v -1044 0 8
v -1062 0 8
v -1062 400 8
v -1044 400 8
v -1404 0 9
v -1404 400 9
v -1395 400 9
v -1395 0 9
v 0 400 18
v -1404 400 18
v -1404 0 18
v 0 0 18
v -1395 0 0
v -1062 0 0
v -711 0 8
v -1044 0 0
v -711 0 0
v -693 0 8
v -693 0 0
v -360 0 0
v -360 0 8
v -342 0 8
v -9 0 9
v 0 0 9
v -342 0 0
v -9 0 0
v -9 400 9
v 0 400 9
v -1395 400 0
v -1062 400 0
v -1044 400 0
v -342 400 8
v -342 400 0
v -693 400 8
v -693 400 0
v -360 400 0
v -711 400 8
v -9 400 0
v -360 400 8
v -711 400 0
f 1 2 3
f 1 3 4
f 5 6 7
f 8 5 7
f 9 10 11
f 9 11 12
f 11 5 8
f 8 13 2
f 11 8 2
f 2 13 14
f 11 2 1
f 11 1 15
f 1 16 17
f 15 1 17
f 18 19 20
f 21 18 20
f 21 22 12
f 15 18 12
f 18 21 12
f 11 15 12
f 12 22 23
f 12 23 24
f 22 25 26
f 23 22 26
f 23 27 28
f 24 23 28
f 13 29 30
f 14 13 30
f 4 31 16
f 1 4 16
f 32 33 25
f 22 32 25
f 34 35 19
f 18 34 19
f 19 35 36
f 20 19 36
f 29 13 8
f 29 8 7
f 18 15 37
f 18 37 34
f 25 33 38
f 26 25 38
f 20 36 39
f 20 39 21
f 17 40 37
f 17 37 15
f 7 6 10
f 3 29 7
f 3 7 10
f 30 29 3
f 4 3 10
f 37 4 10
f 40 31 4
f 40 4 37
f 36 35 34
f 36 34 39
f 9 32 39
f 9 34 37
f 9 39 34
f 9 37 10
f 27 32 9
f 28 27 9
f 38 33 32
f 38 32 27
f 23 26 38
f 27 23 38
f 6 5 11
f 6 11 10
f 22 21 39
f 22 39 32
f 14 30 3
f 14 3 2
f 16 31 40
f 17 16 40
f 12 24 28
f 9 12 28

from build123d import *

# Parameters (mm, degrees)
SKETCH_W        = 1404
SKETCH_H        = 400
PAD_DEPTH       = 18
SKETCH001_W     = 9
SKETCH001_H     = 400
POCKET_DEPTH    = 9
SKETCH002_W     = 18
SKETCH002_H     = 400
POCKET001_DEPTH = 8


with BuildPart() as part:
    # Sketch → Pad (new body)
    with BuildSketch(Plane.XY):
        with Locations((-702, 200)):
            Rectangle(SKETCH_W, SKETCH_H)
    extrude(amount=PAD_DEPTH)

    # Sketch001 → Pocket (cut)
    with BuildSketch(Plane.XY):
        with Locations((-4.5, 200)):
            Rectangle(SKETCH001_W, SKETCH001_H)
        with Locations((-1399.5, 200)):
            Rectangle(SKETCH001_W, SKETCH001_H)
    extrude(amount=POCKET_DEPTH, mode=Mode.SUBTRACT)

    # Sketch002 (on Face4 of Pocket) → Pocket001 (cut)
    with BuildSketch(Plane(origin=(0, 0, 0), x_dir=(1, 0, 0), z_dir=(0, 0, -1))):
        with Locations((-351, -200)):
            Rectangle(SKETCH002_W, SKETCH002_H)
        with Locations((-702, -200)):
            Rectangle(SKETCH002_W, SKETCH002_H)
        with Locations((-1053, -200)):
            Rectangle(SKETCH002_W, SKETCH002_H)
    extrude(amount=-POCKET001_DEPTH, mode=Mode.SUBTRACT)


solid = part.part
